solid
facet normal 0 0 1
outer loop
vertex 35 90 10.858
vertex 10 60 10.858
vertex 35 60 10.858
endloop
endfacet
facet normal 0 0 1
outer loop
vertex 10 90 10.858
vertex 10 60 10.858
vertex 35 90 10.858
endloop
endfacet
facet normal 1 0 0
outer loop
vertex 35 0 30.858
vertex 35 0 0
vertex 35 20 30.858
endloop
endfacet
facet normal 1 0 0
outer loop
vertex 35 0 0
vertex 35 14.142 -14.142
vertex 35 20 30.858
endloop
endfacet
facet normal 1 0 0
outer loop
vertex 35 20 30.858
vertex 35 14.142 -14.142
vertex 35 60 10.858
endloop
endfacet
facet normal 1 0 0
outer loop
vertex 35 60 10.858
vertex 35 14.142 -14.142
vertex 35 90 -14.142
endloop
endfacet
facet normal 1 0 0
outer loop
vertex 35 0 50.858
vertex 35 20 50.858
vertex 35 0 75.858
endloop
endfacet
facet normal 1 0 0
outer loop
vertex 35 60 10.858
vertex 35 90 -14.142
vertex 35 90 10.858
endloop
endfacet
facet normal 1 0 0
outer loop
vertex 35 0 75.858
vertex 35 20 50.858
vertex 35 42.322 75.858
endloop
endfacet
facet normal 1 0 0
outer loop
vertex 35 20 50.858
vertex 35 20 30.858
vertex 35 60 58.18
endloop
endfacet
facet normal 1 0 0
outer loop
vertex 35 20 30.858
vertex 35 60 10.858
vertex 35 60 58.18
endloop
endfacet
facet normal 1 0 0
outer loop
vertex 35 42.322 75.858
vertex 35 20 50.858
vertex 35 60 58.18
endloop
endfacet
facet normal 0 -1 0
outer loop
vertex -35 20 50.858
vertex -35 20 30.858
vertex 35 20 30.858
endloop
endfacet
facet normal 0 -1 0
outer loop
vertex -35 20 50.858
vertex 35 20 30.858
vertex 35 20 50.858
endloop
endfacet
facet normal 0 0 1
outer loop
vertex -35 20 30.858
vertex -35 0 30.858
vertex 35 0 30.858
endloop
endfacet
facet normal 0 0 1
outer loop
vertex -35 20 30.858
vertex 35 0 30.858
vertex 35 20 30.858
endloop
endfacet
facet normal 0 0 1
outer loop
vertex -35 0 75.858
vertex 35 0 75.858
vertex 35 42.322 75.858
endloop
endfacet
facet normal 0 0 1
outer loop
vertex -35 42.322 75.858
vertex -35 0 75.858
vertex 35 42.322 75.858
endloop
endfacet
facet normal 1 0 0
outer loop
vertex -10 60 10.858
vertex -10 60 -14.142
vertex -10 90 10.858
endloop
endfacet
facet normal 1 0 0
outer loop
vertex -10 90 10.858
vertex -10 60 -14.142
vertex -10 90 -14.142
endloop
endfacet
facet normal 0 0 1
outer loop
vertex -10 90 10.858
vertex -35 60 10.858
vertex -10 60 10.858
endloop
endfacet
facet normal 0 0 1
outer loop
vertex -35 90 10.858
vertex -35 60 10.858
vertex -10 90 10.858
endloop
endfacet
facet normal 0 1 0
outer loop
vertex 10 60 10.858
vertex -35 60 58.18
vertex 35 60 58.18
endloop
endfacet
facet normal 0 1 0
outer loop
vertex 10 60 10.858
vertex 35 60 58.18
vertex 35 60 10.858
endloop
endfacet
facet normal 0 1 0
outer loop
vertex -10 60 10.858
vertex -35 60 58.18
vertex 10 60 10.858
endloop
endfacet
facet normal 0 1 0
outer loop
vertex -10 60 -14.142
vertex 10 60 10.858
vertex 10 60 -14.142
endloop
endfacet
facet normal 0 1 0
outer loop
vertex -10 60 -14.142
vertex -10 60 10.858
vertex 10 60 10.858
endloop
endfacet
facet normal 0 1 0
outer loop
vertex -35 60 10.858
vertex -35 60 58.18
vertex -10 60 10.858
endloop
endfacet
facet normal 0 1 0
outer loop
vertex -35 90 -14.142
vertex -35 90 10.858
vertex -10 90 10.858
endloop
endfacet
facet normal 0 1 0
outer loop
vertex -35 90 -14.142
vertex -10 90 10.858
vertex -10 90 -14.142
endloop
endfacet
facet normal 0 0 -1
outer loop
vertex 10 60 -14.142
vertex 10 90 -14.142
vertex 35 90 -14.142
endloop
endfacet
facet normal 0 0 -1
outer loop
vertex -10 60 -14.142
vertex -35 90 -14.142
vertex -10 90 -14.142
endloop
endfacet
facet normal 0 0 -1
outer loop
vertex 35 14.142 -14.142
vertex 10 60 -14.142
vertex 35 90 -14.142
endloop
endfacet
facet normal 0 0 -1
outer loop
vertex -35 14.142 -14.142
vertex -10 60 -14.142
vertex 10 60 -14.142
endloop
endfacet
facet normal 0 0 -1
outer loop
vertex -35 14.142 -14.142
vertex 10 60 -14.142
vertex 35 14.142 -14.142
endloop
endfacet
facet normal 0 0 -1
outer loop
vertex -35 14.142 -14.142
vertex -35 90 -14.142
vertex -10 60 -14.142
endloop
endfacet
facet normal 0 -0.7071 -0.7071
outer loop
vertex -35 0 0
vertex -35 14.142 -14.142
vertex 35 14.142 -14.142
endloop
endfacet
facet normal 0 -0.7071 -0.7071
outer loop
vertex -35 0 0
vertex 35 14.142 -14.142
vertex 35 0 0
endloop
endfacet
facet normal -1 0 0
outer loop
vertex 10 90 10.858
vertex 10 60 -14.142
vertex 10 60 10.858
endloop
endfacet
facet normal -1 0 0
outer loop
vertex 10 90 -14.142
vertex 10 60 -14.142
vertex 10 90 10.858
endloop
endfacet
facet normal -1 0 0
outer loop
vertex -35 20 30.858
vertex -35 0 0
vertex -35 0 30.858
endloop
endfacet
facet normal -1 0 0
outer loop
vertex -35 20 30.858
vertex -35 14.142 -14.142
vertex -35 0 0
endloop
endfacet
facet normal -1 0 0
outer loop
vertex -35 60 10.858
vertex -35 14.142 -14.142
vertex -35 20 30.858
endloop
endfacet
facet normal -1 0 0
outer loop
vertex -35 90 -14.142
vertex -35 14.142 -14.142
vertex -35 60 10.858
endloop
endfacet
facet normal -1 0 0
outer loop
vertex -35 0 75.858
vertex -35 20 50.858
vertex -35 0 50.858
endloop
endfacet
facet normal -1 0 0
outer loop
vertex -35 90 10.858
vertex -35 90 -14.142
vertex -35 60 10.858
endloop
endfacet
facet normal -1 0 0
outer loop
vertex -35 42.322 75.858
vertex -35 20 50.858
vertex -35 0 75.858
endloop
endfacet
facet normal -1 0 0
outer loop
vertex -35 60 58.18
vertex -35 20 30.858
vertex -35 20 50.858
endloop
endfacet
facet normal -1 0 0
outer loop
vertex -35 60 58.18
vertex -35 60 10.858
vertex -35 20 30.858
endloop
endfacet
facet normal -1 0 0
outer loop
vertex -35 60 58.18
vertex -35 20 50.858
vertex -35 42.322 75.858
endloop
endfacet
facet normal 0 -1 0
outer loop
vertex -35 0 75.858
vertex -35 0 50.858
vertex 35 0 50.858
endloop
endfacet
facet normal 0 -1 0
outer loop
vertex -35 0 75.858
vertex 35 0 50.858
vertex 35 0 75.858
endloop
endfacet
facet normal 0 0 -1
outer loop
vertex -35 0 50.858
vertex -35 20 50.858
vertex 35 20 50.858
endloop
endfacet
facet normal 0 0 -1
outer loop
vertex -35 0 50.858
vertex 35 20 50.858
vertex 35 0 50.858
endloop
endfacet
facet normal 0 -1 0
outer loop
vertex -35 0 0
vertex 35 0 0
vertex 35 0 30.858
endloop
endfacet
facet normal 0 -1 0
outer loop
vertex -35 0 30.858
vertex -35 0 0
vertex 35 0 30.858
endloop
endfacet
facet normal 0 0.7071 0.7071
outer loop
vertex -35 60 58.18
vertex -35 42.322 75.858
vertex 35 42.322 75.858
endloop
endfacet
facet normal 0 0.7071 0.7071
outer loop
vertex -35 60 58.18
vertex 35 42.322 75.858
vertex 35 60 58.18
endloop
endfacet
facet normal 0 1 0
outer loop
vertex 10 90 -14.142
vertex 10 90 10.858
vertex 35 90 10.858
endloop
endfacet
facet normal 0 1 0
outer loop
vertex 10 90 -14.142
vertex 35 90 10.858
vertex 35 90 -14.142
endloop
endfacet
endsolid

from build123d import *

# Parameters (mm, degrees)
BOSS_EXTRUDE1_DEPTH      = 35
BOSS_EXTRUDE1_DEPTH_BACK = 35
CUT_EXTRUDE1_DEPTH       = 13
CUT_EXTRUDE1_DEPTH_BACK  = 17
SKETCH2_W                = 20
SKETCH2_H                = 30


with BuildPart() as part:
    # Sketch1 → Boss-Extrude1 (new, two sides: drawn at the far end of the back side and taken through both)
    with BuildSketch(Plane(origin=(0, 0, 0), x_dir=(0, 0, -1), z_dir=(1, 0, 0)).offset(-BOSS_EXTRUDE1_DEPTH_BACK)):
        Polygon((0, 0), (-30.857864376, 0), (-30.857864376, 20), (-50.857864376, 20), (-50.857864376, 0), (-75.857864376, 0), (-75.857864376, 42.32233047), (-58.180194847, 60), (-10.857864376, 60), (-10.857864376, 90), (14.142135624, 90), (14.142135624, 14.142135624), align=None)
    extrude(amount=BOSS_EXTRUDE1_DEPTH + BOSS_EXTRUDE1_DEPTH_BACK)

    # Sketch2 → Cut-Extrude1 (cut, two sides: drawn at the far end of the back side and taken through both)
    with BuildSketch(Plane.XY.offset(-CUT_EXTRUDE1_DEPTH_BACK)):
        with Locations((0, 75)):
            Rectangle(SKETCH2_W, SKETCH2_H)
    extrude(amount=CUT_EXTRUDE1_DEPTH + CUT_EXTRUDE1_DEPTH_BACK, mode=Mode.SUBTRACT)


solid = part.part
